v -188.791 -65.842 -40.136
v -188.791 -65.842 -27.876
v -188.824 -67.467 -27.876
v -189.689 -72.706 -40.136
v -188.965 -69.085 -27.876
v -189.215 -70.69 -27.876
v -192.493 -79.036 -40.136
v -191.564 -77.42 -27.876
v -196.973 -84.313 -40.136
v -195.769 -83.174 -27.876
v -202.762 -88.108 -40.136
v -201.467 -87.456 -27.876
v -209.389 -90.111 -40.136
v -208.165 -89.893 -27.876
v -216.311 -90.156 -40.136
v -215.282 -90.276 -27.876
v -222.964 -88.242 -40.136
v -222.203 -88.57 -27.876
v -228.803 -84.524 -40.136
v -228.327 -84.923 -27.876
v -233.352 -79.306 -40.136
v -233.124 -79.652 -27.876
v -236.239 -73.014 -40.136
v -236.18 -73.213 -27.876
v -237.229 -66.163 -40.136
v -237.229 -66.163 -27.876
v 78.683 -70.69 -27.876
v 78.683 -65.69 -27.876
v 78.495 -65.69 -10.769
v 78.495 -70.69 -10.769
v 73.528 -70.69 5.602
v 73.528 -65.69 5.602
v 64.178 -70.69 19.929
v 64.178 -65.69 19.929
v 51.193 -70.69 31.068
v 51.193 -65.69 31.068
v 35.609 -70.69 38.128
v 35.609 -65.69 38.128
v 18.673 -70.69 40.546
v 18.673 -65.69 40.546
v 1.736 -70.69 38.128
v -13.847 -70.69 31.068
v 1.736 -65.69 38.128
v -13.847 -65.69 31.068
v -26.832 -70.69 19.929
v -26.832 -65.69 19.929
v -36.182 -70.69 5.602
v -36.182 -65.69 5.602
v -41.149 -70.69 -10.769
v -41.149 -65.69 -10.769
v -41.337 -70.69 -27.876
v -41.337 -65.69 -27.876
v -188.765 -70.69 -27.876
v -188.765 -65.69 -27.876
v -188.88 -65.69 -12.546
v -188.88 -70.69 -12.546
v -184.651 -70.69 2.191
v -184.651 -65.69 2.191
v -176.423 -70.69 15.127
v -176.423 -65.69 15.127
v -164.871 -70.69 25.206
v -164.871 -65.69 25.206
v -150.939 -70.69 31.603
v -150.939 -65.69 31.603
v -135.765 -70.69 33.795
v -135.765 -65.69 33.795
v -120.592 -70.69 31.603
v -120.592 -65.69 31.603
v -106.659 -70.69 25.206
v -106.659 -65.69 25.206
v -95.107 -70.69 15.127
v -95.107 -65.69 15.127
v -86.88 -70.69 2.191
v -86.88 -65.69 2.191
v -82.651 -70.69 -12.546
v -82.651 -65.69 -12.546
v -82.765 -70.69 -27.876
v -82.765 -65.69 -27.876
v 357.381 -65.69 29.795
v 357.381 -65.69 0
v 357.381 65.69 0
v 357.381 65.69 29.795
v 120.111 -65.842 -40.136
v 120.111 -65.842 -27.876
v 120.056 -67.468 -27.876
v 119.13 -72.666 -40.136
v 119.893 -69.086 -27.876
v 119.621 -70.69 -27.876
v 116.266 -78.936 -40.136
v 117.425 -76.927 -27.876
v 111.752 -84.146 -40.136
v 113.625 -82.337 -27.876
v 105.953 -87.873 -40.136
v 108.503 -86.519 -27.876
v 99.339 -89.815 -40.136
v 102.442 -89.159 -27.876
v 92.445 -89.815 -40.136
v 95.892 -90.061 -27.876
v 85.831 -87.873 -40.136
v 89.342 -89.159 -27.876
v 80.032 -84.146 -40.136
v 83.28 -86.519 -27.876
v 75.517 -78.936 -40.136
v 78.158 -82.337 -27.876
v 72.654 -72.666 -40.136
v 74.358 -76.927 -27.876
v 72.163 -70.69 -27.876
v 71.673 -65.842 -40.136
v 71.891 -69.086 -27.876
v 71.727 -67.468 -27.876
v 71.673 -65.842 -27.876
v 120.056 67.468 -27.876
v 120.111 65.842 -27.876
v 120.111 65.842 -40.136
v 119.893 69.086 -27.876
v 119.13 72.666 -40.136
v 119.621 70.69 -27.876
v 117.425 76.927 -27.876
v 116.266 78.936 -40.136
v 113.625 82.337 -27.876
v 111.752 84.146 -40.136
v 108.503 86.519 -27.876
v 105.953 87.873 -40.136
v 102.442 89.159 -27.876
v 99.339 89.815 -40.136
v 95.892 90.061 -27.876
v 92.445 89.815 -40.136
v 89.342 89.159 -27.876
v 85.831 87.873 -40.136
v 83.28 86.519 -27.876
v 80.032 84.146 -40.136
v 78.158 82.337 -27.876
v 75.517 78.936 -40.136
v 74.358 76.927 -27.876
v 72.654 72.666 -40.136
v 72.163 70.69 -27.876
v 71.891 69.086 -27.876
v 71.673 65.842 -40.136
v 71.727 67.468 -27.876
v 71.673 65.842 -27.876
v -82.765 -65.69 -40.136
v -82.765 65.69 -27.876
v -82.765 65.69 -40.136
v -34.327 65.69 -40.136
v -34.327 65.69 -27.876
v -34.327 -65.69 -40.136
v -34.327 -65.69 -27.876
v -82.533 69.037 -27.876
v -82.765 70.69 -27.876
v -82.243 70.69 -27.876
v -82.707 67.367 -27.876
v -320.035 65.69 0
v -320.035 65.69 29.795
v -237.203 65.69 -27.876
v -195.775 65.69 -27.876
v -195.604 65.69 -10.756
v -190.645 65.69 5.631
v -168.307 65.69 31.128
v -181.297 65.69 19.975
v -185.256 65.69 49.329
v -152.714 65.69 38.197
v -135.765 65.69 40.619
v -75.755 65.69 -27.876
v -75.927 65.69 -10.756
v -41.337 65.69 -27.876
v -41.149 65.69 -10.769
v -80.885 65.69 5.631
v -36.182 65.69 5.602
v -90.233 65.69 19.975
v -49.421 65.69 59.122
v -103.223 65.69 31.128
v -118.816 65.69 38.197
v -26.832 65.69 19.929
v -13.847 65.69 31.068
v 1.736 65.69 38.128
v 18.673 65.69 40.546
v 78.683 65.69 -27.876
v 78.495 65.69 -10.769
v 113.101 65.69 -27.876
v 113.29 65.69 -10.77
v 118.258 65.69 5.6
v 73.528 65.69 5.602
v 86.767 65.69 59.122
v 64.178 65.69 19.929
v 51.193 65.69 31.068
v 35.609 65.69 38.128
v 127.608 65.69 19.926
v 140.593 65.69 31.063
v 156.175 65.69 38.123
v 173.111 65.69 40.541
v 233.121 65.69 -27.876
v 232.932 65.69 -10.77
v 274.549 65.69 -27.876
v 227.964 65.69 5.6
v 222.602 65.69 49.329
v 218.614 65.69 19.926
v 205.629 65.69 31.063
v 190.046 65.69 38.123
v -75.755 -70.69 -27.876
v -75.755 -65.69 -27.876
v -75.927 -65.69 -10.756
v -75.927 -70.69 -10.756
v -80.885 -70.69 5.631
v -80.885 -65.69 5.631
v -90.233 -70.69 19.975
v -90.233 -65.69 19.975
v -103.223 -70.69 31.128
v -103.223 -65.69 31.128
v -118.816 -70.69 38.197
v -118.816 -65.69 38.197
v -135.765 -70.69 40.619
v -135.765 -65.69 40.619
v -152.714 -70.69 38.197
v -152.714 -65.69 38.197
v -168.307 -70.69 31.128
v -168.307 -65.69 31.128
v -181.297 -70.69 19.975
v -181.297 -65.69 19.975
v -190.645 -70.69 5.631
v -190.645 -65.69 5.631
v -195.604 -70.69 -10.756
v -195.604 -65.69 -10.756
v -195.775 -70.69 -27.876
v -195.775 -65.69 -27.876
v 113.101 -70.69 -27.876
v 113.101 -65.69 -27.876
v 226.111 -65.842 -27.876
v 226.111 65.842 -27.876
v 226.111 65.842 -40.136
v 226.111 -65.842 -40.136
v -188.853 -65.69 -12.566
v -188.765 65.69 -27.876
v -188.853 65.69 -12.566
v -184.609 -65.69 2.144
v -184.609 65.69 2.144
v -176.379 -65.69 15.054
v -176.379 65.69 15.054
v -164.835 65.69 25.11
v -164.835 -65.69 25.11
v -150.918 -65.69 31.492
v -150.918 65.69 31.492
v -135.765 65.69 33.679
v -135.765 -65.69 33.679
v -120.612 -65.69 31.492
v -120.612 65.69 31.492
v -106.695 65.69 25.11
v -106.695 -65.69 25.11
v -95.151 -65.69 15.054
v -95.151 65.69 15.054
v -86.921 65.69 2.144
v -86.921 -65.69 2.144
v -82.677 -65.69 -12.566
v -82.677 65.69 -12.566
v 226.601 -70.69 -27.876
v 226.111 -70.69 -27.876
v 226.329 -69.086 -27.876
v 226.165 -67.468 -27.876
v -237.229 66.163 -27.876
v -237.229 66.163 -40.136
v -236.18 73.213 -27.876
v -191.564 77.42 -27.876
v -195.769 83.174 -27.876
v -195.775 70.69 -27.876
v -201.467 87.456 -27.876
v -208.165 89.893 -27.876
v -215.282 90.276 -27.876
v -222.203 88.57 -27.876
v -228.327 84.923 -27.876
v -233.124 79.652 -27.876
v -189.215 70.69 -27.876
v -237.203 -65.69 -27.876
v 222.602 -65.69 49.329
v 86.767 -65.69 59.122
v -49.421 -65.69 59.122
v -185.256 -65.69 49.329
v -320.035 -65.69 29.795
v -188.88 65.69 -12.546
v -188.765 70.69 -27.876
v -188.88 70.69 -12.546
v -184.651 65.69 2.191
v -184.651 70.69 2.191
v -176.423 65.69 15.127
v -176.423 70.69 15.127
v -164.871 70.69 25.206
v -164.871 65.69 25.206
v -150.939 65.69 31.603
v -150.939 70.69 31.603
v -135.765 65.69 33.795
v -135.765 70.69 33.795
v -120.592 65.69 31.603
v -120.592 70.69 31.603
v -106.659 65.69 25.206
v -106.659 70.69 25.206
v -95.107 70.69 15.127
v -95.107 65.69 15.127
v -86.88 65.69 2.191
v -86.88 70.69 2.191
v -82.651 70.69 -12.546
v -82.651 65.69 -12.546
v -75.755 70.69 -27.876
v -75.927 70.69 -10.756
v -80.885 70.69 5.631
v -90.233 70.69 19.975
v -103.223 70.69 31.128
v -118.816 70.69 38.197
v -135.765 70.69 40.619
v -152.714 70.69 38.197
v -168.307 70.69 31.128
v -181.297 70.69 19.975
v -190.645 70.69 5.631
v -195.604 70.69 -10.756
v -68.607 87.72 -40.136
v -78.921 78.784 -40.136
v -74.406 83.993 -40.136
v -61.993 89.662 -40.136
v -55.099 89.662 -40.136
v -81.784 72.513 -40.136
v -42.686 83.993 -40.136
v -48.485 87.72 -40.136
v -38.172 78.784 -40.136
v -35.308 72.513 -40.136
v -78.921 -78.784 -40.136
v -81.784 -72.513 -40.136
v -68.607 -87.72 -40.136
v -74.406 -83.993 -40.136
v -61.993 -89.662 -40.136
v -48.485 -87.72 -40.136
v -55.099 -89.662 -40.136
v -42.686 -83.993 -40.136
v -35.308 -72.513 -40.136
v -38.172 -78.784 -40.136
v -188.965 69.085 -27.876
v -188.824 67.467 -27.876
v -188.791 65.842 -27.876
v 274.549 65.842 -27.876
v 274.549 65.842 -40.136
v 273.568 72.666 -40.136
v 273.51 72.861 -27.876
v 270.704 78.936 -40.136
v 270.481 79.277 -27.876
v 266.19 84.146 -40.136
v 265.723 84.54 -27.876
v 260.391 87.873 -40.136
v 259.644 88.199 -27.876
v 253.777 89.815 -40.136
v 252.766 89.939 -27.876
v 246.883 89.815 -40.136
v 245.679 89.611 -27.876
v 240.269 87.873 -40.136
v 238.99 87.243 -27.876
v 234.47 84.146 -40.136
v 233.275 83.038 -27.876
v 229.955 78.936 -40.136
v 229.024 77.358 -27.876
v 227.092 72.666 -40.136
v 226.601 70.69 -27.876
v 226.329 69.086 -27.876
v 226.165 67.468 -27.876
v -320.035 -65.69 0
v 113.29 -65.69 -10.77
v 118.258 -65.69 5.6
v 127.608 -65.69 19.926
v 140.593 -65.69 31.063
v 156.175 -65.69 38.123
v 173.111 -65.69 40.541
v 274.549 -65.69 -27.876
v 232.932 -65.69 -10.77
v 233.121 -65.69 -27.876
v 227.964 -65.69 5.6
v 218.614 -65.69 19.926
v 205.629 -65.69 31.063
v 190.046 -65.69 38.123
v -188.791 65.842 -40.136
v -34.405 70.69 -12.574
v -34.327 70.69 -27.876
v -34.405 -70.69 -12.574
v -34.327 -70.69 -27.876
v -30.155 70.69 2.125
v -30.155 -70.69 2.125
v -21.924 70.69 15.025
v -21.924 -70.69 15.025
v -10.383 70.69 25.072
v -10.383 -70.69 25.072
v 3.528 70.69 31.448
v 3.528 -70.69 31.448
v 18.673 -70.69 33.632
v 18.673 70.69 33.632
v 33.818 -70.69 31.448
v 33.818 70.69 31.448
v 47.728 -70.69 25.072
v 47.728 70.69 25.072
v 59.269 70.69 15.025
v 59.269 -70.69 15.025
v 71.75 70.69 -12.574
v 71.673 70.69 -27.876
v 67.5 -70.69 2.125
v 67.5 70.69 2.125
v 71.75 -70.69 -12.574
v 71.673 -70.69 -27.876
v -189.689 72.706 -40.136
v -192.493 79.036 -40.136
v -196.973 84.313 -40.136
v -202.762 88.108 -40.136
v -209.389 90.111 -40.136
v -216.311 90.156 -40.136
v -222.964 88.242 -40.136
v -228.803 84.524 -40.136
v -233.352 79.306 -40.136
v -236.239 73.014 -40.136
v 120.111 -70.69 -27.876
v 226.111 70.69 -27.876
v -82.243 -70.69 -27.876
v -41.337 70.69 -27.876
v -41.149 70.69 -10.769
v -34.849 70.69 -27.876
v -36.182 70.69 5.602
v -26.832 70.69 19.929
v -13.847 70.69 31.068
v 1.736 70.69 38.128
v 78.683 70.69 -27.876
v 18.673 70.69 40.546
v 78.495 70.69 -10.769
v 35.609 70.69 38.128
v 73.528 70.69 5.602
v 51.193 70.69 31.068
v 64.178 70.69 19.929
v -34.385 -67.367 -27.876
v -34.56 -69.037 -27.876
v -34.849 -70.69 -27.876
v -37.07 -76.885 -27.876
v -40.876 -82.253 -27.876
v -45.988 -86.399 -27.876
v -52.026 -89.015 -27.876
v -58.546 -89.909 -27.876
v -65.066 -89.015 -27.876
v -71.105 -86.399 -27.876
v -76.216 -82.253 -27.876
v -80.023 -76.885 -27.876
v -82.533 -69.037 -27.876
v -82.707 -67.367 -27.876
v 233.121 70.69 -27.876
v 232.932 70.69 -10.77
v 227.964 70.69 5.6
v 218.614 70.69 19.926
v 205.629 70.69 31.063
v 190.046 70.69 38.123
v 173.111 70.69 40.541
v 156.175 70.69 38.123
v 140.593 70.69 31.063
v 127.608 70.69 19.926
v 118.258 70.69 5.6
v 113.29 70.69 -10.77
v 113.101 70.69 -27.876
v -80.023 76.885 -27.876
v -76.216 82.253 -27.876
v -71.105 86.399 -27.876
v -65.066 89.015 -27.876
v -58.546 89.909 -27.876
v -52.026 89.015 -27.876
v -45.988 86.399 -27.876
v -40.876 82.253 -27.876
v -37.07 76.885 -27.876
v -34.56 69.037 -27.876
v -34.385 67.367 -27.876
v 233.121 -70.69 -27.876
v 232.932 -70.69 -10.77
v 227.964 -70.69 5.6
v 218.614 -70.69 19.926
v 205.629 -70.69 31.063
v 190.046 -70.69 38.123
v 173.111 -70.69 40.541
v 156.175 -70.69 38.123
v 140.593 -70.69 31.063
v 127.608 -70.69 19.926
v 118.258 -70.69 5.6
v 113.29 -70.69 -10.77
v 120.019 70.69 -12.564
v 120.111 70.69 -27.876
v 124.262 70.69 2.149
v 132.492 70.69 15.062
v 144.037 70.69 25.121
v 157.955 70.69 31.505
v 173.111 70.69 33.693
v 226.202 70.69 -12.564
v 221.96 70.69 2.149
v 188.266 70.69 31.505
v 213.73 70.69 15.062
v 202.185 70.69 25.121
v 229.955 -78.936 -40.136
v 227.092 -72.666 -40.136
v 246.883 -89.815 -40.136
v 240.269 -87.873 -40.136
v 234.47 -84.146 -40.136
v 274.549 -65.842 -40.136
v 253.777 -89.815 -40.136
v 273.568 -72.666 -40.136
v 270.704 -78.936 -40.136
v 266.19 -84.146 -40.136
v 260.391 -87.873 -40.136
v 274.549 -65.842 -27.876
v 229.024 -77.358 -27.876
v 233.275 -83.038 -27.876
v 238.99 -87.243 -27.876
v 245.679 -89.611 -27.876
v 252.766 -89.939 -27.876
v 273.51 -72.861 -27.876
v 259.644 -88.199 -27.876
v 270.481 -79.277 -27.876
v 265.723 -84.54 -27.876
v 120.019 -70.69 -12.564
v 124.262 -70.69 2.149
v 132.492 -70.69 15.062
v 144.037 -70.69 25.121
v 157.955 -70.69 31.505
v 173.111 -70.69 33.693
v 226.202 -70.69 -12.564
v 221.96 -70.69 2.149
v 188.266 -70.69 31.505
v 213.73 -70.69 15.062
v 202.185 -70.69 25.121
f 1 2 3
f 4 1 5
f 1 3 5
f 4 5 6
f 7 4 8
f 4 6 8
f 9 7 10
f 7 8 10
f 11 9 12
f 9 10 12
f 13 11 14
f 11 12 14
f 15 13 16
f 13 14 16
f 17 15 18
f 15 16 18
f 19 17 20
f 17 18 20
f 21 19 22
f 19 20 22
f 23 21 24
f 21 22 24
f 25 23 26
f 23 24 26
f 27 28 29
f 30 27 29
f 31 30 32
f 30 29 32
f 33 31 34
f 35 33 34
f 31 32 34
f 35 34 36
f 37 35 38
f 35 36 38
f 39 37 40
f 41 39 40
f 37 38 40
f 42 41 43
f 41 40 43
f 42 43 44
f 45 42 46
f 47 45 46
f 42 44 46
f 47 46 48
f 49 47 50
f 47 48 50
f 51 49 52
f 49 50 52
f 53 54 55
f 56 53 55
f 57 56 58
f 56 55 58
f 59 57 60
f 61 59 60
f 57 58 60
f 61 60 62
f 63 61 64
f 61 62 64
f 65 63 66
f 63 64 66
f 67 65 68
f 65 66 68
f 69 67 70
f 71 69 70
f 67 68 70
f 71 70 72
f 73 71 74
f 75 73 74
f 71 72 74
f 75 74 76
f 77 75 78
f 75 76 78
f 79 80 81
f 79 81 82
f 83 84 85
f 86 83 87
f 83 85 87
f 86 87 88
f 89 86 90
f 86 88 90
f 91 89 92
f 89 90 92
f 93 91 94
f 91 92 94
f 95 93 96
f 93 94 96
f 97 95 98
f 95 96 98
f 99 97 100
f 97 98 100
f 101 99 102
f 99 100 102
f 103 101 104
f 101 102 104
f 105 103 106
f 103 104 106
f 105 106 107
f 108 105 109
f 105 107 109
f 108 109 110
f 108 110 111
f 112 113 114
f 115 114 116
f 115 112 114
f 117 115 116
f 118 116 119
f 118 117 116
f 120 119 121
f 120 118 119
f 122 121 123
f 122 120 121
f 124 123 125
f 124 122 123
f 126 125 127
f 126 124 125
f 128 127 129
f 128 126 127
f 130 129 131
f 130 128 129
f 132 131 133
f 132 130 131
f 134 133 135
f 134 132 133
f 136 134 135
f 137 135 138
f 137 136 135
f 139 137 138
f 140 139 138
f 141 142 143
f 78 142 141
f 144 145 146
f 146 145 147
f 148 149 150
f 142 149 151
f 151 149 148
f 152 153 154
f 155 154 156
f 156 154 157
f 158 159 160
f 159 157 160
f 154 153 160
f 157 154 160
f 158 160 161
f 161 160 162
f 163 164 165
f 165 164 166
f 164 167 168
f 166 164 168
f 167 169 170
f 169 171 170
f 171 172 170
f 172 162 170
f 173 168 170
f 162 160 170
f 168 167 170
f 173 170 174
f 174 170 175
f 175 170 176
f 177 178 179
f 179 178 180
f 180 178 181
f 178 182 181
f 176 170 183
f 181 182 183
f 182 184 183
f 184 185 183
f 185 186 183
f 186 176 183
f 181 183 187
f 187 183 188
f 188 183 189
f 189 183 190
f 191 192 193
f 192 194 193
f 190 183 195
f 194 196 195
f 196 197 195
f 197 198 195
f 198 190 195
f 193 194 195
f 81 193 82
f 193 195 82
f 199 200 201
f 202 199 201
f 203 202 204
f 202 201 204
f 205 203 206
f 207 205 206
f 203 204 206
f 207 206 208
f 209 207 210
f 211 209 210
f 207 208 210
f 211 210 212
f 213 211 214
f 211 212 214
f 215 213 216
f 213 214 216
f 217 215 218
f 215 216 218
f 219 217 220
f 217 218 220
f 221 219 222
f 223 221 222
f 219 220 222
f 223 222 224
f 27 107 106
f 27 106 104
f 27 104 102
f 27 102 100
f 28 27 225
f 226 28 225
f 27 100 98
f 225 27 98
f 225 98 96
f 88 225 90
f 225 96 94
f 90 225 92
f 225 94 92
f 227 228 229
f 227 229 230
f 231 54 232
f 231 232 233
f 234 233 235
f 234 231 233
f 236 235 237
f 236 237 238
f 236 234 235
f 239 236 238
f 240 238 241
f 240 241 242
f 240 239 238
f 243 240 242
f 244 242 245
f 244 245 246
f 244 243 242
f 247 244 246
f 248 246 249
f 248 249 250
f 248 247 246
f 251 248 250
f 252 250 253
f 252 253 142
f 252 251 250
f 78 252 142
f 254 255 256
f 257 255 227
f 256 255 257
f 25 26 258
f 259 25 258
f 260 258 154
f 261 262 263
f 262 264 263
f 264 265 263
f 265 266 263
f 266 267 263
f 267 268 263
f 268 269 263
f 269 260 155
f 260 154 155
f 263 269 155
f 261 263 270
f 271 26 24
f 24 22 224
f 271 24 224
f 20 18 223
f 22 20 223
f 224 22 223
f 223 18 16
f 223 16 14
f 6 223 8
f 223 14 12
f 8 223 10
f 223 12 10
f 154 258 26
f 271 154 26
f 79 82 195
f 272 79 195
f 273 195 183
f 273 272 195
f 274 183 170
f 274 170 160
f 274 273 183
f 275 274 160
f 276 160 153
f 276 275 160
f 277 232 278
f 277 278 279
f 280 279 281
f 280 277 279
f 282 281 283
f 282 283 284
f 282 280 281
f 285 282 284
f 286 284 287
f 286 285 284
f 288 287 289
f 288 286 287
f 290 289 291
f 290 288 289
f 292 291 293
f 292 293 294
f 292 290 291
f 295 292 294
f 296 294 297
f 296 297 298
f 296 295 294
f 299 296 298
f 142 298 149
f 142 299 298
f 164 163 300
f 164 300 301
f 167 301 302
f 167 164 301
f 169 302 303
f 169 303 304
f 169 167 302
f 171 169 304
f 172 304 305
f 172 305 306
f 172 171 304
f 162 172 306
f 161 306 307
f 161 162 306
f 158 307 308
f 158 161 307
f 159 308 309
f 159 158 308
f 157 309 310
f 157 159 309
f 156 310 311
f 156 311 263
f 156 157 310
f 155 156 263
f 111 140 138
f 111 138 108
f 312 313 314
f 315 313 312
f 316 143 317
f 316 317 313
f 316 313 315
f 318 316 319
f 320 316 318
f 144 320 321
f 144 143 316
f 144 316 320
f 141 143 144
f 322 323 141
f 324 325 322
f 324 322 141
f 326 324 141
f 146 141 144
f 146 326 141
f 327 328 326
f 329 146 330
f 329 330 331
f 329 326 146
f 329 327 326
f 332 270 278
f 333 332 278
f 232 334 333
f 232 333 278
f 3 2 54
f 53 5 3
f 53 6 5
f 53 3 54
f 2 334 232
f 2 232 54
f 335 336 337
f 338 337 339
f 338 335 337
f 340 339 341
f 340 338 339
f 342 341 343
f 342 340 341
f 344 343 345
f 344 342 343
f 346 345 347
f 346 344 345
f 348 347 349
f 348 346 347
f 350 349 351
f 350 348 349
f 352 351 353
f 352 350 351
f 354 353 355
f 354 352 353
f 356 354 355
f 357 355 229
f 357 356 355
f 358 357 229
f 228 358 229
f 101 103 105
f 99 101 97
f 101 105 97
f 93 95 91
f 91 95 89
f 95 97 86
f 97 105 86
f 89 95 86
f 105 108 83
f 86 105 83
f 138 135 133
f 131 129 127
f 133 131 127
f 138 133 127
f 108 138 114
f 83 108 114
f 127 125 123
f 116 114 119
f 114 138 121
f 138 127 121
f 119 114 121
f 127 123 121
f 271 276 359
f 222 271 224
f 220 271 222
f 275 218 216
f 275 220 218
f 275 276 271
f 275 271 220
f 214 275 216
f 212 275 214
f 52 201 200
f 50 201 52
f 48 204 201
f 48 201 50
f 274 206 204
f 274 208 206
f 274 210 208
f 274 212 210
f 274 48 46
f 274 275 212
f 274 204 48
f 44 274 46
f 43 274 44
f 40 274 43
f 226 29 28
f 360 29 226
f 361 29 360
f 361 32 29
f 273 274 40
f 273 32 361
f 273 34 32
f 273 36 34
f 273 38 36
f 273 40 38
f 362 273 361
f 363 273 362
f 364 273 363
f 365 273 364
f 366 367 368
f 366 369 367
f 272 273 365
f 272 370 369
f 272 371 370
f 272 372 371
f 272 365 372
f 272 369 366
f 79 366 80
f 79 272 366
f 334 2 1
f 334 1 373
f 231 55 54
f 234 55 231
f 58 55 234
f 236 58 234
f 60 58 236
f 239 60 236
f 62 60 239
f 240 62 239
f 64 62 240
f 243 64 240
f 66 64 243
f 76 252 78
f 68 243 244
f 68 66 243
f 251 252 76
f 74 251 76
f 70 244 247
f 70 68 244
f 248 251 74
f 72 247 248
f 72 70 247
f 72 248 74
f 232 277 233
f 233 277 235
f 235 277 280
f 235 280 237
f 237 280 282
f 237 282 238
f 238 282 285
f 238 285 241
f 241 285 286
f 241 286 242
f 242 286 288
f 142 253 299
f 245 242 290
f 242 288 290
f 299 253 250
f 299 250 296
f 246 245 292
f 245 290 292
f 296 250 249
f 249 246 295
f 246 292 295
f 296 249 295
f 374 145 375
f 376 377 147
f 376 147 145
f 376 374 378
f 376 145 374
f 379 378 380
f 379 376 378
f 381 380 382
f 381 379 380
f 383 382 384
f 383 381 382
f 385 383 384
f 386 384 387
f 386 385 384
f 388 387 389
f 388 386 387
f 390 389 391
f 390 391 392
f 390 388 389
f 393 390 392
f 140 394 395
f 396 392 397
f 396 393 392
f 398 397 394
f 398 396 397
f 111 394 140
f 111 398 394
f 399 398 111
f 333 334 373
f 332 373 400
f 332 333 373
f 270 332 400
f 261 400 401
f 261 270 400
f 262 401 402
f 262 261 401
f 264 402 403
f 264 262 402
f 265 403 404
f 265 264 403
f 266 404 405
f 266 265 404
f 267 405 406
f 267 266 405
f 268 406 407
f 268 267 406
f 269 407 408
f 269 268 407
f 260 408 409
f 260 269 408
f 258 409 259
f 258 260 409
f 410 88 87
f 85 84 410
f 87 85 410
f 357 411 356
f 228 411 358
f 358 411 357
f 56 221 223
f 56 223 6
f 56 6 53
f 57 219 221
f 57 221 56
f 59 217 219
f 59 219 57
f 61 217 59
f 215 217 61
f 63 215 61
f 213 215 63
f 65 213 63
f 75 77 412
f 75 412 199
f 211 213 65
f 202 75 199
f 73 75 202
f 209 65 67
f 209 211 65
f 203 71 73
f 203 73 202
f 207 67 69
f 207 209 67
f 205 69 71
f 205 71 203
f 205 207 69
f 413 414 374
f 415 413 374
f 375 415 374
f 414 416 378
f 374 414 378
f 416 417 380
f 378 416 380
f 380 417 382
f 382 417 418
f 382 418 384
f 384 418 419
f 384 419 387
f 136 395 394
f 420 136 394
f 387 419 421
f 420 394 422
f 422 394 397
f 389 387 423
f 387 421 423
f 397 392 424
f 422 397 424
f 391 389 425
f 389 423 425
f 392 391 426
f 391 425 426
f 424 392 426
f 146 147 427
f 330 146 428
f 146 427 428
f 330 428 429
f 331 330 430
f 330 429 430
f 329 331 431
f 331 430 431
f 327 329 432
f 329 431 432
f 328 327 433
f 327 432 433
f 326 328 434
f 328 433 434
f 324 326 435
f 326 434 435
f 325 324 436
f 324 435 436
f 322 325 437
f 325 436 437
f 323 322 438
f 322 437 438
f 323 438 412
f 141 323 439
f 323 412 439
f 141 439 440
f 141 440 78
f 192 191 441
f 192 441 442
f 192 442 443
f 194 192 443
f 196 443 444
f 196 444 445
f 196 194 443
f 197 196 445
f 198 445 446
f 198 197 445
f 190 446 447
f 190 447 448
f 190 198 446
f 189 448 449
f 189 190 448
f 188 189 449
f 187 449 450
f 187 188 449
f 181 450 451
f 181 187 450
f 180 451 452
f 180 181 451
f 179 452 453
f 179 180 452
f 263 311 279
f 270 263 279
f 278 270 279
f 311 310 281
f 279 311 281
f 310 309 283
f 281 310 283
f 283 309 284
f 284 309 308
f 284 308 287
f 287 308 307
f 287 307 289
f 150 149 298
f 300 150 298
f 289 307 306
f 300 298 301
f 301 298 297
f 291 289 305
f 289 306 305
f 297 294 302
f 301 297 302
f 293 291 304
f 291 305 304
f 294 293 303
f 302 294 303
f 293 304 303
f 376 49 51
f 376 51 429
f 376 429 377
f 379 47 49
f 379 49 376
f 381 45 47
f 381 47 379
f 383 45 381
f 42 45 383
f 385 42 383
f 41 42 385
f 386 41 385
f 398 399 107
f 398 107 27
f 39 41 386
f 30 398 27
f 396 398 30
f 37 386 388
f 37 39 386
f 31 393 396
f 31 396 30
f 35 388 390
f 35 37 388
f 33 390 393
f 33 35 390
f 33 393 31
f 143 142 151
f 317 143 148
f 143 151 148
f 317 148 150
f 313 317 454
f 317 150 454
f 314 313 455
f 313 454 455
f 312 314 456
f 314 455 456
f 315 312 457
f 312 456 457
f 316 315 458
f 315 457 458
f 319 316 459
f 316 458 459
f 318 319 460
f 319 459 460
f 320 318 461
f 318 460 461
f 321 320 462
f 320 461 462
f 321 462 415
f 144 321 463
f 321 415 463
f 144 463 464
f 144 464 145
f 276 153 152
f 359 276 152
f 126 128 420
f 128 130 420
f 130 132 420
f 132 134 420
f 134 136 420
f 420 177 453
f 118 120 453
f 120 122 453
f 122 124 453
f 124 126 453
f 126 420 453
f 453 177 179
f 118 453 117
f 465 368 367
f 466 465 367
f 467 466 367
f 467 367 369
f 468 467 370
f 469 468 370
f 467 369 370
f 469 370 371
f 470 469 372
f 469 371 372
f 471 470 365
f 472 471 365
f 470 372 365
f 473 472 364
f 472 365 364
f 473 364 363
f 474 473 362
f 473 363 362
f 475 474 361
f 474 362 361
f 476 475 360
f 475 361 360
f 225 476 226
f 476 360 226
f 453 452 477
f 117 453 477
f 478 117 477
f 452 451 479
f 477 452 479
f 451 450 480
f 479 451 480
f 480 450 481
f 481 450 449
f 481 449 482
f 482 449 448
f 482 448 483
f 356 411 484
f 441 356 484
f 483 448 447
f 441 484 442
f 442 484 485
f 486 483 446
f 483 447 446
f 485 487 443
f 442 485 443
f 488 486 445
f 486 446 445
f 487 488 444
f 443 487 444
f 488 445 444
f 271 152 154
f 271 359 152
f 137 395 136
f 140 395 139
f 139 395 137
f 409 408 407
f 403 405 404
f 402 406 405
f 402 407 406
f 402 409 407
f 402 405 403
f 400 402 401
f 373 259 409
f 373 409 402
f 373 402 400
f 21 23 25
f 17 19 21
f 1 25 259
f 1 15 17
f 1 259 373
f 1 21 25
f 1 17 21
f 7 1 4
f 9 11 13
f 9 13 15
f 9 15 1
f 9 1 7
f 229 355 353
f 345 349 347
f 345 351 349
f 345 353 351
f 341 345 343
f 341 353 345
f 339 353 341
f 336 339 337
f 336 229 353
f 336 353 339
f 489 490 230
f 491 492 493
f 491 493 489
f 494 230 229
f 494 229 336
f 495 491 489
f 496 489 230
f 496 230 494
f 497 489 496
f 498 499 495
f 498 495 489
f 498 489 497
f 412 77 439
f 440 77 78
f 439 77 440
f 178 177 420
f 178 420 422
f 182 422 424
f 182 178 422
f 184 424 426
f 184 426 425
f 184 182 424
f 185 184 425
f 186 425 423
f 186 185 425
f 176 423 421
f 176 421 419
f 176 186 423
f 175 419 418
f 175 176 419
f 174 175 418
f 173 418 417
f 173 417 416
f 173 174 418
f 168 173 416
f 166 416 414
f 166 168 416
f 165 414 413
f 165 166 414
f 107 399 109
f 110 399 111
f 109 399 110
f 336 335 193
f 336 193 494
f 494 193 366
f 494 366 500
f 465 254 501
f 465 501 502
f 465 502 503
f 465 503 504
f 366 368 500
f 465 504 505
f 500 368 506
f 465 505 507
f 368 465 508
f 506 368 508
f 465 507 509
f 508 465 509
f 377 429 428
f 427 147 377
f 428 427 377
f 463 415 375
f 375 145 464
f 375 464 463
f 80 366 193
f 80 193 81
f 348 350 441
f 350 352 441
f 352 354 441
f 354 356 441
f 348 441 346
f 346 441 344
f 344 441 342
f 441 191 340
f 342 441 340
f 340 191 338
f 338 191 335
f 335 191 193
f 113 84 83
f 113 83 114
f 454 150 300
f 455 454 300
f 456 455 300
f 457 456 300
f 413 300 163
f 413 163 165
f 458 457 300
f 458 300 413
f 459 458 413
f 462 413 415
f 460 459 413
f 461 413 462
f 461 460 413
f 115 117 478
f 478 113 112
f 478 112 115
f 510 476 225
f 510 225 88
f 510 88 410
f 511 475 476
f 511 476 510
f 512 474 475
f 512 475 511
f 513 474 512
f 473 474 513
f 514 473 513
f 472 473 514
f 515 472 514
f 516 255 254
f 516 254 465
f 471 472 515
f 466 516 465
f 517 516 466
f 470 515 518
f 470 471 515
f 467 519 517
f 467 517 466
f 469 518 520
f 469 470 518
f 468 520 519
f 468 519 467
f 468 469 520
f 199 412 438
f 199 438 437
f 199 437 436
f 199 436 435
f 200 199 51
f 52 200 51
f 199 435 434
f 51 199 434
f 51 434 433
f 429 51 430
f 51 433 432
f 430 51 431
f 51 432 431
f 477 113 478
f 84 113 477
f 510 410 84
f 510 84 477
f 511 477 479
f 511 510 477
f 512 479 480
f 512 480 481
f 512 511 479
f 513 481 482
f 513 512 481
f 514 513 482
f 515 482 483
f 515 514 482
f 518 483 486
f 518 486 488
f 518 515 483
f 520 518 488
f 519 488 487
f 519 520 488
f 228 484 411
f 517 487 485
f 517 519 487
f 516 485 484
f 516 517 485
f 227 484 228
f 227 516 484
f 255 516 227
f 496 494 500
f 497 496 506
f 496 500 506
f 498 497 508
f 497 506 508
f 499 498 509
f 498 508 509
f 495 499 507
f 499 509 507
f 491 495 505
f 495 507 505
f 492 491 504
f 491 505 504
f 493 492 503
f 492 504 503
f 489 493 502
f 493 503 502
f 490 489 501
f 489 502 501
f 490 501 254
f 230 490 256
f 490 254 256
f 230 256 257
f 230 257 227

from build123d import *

# Parameters (mm, degrees)
F1_DEPTH = 65.69
F2_W     = 48.438
F2_H     = 131.38
F3_DEPTH = 12.26
F5_DEPTH = 5


# Not quite as in the source:
# - a feature names something its author has since deleted; it is built from what else it names


with BuildPart() as f1:
    # F0 (on Front) → F1 (new body, symmetric)
    with BuildSketch(Plane.XZ):
        with BuildLine():
            Line((-320.0353384018, 0), (-237.2032226722, -27.8760867547))
            Line((-237.2032226722, -27.8760867547), (-188.7652226722, -27.8760867547))
            ThreePointArc((-188.7652226722, -27.8760867547), (-135.7652226722, 33.6790422812), (-82.7652226722, -27.8760867547))
            Line((-82.7652226722, -27.8760867547), (-34.3272226722, -27.8760867547))
            ThreePointArc((-34.3272226722, -27.8760867547), (18.6727773278, 33.6324801702), (71.6727773278, -27.8760867547))
            Line((71.6727773278, -27.8760867547), (120.1107773278, -27.8760867547))
            ThreePointArc((120.1107773278, -27.8760867547), (173.1107773278, 33.6925448374), (226.1107773278, -27.8760867547))
            Line((226.1107773278, -27.8760867547), (274.5487773278, -27.8760867547))
            Line((274.5487773278, -27.8760867547), (357.3808930574, 0))
            Line((357.3808930574, 0), (357.3808930574, 29.795))
            ThreePointArc((357.3808930574, 29.795), (18.6727773278, 60.3473106454), (-320.0353384018, 29.795))
            Line((-320.0353384018, 29.795), (-320.0353384018, 0))
        make_face()
    extrude(amount=F1_DEPTH, both=True)

    # F2 (on face) → F3 (join)
    with BuildSketch(Plane(origin=(0, 0, -27.8760867547), x_dir=(1, 0, 0), z_dir=(0, 0, -1))):
        with BuildLine():
            ThreePointArc((-237.2286491756, -65.5376471925), (-213.0855863574, -89.7567669916), (-188.7906491756, -65.69))
            Line((-188.7906491756, -65.69), (-188.7906491756, 65.8423528075))
            ThreePointArc((-188.7906491756, 65.8423528075), (-212.8485010036, 90.3820549045), (-237.2286491756, 66.1625258279))
            Line((-237.2286491756, 66.1625258279), (-237.2286491756, -65.5376471925))
        make_face()
        with Locations((-58.5462226722, 0)):
            Rectangle(F2_W, F2_H)
        with BuildLine():
            Line((71.6727773278, 65.8423528075), (71.6727773278, -65.69))
            ThreePointArc((71.6727773278, -65.69), (95.8917773278, -89.909), (120.1107773278, -65.69))
            Line((120.1107773278, -65.69), (120.1107773278, 65.8423528075))
            ThreePointArc((120.1107773278, 65.8423528075), (95.8917773278, 90.0613528075), (71.6727773278, 65.8423528075))
        make_face()
        with BuildLine():
            Line((226.1107773278, 65.8423528075), (226.1107773278, -65.69))
            ThreePointArc((226.1107773278, -65.69), (250.3297773278, -89.909), (274.5487773278, -65.69))
            Line((274.5487773278, -65.69), (274.5487773278, 65.8423528075))
            ThreePointArc((274.5487773278, 65.8423528075), (250.3297773278, 90.0613528075), (226.1107773278, 65.8423528075))
        make_face()
        with BuildLine():
            Line((-34.3272226722, -65.69), (-82.7652226722, -65.69))
            ThreePointArc((-82.7652226722, -65.69), (-58.5462226722, -89.909), (-34.3272226722, -65.69))
        make_face()
        with BuildLine():
            ThreePointArc((-34.3272226722, 65.69), (-58.5462226722, 89.909), (-82.7652226722, 65.69))
            Line((-82.7652226722, 65.69), (-34.3272226722, 65.69))
        make_face()
    extrude(amount=F3_DEPTH)

    # F4 (on face) → F5 (join)
    with BuildSketch(Plane.XZ.offset(65.69)):
        with BuildLine():
            ThreePointArc((78.6827773278, -27.8760867547), (18.6727773278, 40.5462292936), (-41.3372226722, -27.8760867547))
            Line((-41.3372226722, -27.8760867547), (-34.3272226722, -27.8760867547))
            ThreePointArc((-34.3272226722, -27.8760867547), (18.6727773278, 33.6324801702), (71.6727773278, -27.8760867547))
            Line((71.6727773278, -27.8760867547), (78.6827773278, -27.8760867547))
        make_face()
        with BuildLine():
            ThreePointArc((233.1207773278, -27.8760867547), (173.1107773278, 40.5405201313), (113.1007773278, -27.8760867547))
            Line((113.1007773278, -27.8760867547), (120.1107773278, -27.8760867547))
            ThreePointArc((120.1107773278, -27.8760867547), (173.1107773278, 33.6925448374), (226.1107773278, -27.8760867547))
            Line((226.1107773278, -27.8760867547), (233.1207773278, -27.8760867547))
        make_face()
        with BuildLine():
            ThreePointArc((-188.7652226722, -27.8760867547), (-135.7652226722, 33.7954088447), (-82.7652226722, -27.8760867547))
            Line((-82.7652226722, -27.8760867547), (-75.7552226722, -27.8760867547))
            ThreePointArc((-75.7552226722, -27.8760867547), (-135.7652226722, 40.6185747484), (-195.7752226722, -27.8760867547))
            Line((-195.7752226722, -27.8760867547), (-188.7906491756, -27.8760867547))
            Line((-188.7906491756, -27.8760867547), (-188.7652226722, -27.8760867547))
        make_face()
    extrude(amount=F5_DEPTH)

    # F6: F1 across plane


with BuildPart() as f1_1:
    add(f1.part)
    add(f1.part.mirror(Plane.XZ))


solid = f1_1.part
